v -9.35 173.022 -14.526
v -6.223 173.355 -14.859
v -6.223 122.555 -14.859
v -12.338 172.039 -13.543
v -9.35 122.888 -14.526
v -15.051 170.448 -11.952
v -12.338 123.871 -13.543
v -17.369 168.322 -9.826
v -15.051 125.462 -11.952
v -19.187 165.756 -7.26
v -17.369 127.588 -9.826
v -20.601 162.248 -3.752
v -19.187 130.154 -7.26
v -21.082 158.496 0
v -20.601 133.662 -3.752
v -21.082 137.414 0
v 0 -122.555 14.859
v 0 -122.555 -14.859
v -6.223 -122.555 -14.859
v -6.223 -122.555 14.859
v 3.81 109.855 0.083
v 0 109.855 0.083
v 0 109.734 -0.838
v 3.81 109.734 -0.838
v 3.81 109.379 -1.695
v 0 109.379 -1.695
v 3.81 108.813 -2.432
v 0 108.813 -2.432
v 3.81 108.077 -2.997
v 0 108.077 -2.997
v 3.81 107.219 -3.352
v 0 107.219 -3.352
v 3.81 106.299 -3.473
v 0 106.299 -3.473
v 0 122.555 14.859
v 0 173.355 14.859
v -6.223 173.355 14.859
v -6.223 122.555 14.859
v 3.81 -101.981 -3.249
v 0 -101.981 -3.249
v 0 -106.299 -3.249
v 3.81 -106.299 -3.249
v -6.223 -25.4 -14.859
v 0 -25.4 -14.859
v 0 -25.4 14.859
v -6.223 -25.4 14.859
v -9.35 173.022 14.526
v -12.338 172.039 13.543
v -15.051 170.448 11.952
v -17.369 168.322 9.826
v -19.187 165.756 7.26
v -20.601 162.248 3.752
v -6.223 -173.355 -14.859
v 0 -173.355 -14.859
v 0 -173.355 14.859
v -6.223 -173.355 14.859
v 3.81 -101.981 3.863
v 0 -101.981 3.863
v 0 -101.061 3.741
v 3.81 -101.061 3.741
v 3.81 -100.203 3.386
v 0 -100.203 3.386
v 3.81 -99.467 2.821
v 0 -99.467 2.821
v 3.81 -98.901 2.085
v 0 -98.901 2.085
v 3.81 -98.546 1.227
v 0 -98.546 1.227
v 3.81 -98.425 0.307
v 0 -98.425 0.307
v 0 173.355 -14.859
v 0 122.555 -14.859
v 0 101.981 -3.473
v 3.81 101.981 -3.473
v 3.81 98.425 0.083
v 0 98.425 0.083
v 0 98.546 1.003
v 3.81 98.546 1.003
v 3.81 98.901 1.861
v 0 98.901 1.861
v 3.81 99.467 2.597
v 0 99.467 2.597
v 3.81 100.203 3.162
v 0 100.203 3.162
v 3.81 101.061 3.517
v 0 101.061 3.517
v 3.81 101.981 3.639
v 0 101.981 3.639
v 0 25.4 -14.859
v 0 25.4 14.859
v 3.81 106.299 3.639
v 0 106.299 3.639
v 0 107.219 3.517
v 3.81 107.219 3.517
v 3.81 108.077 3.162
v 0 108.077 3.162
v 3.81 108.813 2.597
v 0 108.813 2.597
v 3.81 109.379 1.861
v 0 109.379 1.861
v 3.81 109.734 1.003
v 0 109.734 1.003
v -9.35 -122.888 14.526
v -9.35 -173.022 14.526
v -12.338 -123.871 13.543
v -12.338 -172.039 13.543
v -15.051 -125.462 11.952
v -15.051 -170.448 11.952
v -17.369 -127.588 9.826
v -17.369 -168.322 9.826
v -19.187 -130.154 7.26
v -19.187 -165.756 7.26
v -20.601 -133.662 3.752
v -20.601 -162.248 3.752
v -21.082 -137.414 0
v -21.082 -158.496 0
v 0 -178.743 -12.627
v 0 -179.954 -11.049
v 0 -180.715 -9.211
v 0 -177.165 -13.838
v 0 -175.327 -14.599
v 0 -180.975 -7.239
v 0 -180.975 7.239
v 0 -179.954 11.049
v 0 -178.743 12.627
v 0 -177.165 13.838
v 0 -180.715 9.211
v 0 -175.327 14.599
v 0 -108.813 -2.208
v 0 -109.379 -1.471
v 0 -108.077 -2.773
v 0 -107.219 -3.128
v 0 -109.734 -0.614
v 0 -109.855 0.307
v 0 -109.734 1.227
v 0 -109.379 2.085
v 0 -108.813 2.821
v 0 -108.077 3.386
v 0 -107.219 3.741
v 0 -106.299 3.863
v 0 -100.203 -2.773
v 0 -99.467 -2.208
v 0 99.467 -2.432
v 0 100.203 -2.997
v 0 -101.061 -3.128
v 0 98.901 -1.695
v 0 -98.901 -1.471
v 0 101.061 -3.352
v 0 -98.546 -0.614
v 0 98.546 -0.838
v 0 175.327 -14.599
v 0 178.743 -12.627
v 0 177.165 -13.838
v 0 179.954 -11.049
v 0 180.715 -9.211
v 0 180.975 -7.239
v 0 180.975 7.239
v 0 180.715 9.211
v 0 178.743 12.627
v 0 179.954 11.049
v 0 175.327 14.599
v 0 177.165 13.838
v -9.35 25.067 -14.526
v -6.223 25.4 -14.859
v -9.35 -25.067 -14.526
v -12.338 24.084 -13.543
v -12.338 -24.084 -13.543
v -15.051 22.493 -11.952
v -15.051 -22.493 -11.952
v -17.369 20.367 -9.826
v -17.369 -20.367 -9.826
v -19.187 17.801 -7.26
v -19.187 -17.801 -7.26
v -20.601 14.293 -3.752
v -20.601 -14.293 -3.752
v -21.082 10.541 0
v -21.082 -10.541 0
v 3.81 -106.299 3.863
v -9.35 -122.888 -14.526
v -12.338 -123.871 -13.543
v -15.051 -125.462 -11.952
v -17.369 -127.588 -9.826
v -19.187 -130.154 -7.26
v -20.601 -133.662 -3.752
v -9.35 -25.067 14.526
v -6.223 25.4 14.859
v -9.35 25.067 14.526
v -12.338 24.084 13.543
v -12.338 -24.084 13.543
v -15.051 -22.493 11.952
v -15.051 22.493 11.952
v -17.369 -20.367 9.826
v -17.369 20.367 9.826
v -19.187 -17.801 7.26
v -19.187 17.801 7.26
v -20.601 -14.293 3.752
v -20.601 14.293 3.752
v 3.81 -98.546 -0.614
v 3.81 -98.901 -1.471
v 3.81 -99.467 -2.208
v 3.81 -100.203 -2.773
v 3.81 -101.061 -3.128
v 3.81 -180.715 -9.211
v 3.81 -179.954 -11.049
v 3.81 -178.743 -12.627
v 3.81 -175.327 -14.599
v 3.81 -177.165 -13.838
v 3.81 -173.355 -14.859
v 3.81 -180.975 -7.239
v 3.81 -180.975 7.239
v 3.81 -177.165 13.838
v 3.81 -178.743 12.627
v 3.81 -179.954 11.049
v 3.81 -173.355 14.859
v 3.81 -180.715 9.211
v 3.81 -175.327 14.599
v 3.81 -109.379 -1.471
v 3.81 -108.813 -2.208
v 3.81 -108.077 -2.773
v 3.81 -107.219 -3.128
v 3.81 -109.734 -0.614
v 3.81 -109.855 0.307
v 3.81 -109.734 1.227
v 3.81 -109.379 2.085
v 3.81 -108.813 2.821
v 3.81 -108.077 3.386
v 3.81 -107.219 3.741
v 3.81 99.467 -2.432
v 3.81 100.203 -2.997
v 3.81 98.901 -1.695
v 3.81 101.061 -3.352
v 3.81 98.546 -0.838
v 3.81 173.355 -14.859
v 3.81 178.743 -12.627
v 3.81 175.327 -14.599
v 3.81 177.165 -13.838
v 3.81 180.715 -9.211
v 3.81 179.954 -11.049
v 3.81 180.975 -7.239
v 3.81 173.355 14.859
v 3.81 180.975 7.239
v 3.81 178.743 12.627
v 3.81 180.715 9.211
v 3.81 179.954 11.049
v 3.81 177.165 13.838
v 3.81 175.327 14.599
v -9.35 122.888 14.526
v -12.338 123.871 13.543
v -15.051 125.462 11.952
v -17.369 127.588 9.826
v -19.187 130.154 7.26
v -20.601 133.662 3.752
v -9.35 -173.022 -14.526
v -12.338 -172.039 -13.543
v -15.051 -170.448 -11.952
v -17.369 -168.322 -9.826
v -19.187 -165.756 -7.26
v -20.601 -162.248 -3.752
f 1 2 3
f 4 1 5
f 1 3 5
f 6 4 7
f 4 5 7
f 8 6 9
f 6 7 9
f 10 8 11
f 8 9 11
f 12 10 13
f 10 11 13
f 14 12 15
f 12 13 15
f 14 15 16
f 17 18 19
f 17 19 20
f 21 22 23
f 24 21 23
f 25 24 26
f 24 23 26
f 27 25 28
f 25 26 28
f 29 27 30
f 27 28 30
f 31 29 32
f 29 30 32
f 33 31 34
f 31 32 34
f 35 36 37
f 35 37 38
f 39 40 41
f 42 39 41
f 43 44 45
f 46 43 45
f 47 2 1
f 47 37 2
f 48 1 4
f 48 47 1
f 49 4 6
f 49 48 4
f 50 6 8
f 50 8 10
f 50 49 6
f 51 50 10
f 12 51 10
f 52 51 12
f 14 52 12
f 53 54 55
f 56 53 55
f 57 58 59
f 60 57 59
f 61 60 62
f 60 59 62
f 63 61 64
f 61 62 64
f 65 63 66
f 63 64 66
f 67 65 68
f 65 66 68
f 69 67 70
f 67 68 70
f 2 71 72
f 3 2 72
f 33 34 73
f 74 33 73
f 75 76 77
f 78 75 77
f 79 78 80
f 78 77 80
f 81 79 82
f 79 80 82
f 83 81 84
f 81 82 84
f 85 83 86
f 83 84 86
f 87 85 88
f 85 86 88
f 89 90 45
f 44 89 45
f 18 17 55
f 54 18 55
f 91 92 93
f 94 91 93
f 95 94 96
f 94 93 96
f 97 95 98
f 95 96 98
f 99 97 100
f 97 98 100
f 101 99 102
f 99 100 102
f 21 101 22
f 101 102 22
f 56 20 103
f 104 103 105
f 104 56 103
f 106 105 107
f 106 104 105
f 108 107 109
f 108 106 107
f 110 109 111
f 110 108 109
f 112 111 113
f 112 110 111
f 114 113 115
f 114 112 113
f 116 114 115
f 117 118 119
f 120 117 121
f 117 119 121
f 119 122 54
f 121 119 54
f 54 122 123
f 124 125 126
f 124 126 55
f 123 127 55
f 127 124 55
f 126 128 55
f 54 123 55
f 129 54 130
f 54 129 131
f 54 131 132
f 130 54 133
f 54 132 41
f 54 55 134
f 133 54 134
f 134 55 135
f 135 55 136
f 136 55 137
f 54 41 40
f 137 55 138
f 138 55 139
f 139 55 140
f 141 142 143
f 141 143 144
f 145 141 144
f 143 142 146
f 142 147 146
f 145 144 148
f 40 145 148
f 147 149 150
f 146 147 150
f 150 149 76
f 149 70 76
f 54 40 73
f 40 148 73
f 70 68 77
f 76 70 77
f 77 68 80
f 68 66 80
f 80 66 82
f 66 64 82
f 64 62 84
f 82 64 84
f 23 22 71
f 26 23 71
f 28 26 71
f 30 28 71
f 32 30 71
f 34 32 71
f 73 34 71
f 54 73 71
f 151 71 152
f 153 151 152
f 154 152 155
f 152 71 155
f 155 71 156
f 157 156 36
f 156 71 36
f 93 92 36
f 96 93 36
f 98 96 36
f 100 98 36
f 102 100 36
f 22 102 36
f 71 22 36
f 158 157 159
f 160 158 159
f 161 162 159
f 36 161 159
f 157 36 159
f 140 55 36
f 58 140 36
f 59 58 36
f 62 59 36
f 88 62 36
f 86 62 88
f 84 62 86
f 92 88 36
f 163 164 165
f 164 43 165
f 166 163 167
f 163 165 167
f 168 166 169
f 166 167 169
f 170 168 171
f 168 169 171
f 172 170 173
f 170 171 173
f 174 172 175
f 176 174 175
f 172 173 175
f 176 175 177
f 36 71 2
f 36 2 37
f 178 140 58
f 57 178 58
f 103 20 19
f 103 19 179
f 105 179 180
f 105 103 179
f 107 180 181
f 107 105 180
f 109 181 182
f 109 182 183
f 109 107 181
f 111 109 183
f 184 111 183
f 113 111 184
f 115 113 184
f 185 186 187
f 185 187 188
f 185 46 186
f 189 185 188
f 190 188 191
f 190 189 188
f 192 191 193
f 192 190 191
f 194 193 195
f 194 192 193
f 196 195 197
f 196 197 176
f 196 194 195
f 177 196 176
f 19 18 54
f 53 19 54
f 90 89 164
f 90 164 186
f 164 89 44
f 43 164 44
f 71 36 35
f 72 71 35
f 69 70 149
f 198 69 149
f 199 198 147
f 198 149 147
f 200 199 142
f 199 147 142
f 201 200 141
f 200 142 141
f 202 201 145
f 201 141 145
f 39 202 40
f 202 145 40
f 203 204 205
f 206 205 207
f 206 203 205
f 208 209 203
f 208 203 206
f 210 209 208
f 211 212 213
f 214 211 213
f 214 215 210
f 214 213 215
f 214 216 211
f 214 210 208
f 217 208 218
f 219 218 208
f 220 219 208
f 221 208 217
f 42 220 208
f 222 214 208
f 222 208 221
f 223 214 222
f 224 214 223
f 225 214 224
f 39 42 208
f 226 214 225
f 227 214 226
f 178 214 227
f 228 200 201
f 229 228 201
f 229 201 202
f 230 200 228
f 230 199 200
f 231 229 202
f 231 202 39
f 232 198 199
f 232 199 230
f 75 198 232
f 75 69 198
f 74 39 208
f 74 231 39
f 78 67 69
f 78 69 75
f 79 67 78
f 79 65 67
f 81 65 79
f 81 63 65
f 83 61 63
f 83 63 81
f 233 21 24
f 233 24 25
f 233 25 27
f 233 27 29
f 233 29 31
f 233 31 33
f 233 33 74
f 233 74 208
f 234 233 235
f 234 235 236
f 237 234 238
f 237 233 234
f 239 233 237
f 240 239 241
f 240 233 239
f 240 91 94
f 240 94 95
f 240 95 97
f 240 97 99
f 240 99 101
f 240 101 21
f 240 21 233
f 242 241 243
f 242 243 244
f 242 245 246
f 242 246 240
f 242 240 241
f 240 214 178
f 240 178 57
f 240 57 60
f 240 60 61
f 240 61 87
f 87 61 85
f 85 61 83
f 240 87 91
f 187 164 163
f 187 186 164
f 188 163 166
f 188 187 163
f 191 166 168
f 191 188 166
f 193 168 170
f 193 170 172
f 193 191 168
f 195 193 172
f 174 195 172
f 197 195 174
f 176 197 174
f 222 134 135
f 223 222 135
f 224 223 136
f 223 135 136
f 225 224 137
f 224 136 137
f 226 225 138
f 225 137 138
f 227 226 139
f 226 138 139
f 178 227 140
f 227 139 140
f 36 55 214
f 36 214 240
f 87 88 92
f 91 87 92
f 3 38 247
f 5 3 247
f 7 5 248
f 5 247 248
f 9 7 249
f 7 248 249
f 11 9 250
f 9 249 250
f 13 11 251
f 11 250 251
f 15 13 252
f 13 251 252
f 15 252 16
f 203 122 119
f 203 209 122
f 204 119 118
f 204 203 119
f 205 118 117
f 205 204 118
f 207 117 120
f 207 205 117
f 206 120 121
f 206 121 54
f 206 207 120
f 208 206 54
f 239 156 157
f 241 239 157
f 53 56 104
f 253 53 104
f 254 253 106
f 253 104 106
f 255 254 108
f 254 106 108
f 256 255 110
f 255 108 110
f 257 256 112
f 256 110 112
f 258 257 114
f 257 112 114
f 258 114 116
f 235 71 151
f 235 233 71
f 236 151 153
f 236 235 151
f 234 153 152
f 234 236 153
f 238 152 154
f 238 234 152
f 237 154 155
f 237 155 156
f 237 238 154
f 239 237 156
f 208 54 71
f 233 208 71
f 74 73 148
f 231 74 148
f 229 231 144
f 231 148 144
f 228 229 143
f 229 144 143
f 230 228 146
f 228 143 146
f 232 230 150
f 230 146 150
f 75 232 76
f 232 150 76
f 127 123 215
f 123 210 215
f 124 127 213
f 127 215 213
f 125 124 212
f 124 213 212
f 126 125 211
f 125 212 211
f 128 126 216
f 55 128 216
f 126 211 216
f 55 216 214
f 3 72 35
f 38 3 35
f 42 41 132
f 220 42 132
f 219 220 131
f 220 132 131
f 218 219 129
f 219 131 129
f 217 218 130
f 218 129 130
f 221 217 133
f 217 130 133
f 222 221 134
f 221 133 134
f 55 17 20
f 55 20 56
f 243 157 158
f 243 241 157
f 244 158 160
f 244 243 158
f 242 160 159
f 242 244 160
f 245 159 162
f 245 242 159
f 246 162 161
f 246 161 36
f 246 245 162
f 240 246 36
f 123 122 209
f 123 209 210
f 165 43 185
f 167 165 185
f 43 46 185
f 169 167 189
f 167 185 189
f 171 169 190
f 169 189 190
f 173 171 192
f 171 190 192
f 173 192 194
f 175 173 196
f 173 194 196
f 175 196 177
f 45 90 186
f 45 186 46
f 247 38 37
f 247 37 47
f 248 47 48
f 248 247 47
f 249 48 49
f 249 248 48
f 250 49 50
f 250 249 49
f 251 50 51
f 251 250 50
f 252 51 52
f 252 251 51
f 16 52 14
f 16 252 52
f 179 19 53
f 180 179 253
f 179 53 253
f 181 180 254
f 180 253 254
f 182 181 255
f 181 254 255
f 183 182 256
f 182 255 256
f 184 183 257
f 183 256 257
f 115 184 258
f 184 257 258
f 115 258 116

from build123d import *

# Parameters (mm, degrees)
F0_W     = 361.95
F0_H     = 29.718
F1_DEPTH = 3.81
F2_R     = 7.62
F4_DEPTH = 3.81
F5_W     = 50.8
F5_H     = 29.718
F6_DEPTH = 21.082
F7_R     = 14.85899
F7_2_R   = 14.85899
F7_3_R   = 14.85899


# Not quite as in the source:
# - a fillet or chamfer is up to 0.001 mm smaller than in the source, because OpenCascade refuses the exact size


with BuildPart() as f1:
    # F0 (on Right) → F1 (new body)
    with BuildSketch(Plane.YZ):
        Rectangle(F0_W, F0_H)
    extrude(amount=F1_DEPTH)

    # F2
    f2_edges = [f1.edges().sort_by_distance(p)[0] for p in [
        (1.905, 180.975, 14.859),
        (1.905, 180.975, -14.859),
        (1.905, -180.975, 14.859),
        (1.905, -180.975, -14.859),
    ]]
    fillet(f2_edges, radius=F2_R)

    # F3 (on face) → F4 (cut, through all)
    with BuildSketch(Plane(origin=(0, 0, 0), x_dir=(0, -1, 0), z_dir=(-1, 0, 0))):
        with BuildLine():
            Line((-101.981, 3.6386192348), (-106.299, 3.6386192348))
            ThreePointArc((-106.299, 3.6386192348), (-108.8134717139, 2.5970909487), (-109.855, 0.0826192348))
            ThreePointArc((-109.855, 0.0826192348), (-108.8134717139, -2.4318524791), (-106.299, -3.4733807652))
            Line((-106.299, -3.4733807652), (-101.981, -3.4733807652))
            ThreePointArc((-101.981, -3.4733807652), (-99.4665282861, -2.4318524791), (-98.425, 0.0826192348))
            ThreePointArc((-98.425, 0.0826192348), (-99.4665282861, 2.5970909487), (-101.981, 3.6386192348))
        make_face()
        with BuildLine():
            Line((106.299, 3.8625788135), (101.981, 3.8625788135))
            ThreePointArc((101.981, 3.8625788135), (99.4665282861, 2.8210505274), (98.425, 0.3065788135))
            ThreePointArc((98.425, 0.3065788135), (99.4665282861, -2.2078929004), (101.981, -3.2494211865))
            Line((101.981, -3.2494211865), (106.299, -3.2494211865))
            ThreePointArc((106.299, -3.2494211865), (108.8134717139, -2.2078929004), (109.855, 0.3065788135))
            ThreePointArc((109.855, 0.3065788135), (108.8134717139, 2.8210505274), (106.299, 3.8625788135))
        make_face()
    extrude(amount=-F4_DEPTH, mode=Mode.SUBTRACT)


with BuildPart() as f6:
    # F5 (on face) → F6 (new body)
    with BuildSketch(Plane(origin=(0, 0, 0), x_dir=(0, -1, 0), z_dir=(-1, 0, 0))):
        with Locations((-147.955, 0)):
            Rectangle(F5_W, F5_H)
    extrude(amount=F6_DEPTH)

    # F7 (radius 14.859 in the source; OpenCascade refuses exactly that, so slightly less here)
    f7_edges = [f6.edges().sort_by_distance(p)[0] for p in [
        (-21.082, 147.955, 14.859),
        (-21.082, 173.355, 0),
        (-21.082, 147.955, -14.859),
        (-21.082, 122.555, 0),
    ]]
    fillet(f7_edges, radius=F7_R)


with BuildPart() as f6b:
    # F5 (on face) → F6, piece 2 (new body)
    with BuildSketch(Plane(origin=(0, 0, 0), x_dir=(0, -1, 0), z_dir=(-1, 0, 0))):
        Rectangle(F5_W, F5_H)
    extrude(amount=F6_DEPTH)

    # F7#2 (radius 14.859 in the source; OpenCascade refuses exactly that, so slightly less here)
    f7_2_edges = [f6b.edges().sort_by_distance(p)[0] for p in [
        (-21.082, 0, 14.859),
        (-21.082, 25.4, 0),
        (-21.082, 0, -14.859),
        (-21.082, -25.4, 0),
    ]]
    fillet(f7_2_edges, radius=F7_2_R)


with BuildPart() as f6c:
    # F5 (on face) → F6, piece 3 (new body)
    with BuildSketch(Plane(origin=(0, 0, 0), x_dir=(0, -1, 0), z_dir=(-1, 0, 0))):
        with Locations((147.955, 0)):
            Rectangle(F5_W, F5_H)
    extrude(amount=F6_DEPTH)

    # F7#3 (radius 14.859 in the source; OpenCascade refuses exactly that, so slightly less here)
    f7_3_edges = [f6c.edges().sort_by_distance(p)[0] for p in [
        (-21.082, -147.955, 14.859),
        (-21.082, -122.555, 0),
        (-21.082, -147.955, -14.859),
        (-21.082, -173.355, 0),
    ]]
    fillet(f7_3_edges, radius=F7_3_R)


solid = Compound([f1.part, f6.part, f6b.part, f6c.part])
